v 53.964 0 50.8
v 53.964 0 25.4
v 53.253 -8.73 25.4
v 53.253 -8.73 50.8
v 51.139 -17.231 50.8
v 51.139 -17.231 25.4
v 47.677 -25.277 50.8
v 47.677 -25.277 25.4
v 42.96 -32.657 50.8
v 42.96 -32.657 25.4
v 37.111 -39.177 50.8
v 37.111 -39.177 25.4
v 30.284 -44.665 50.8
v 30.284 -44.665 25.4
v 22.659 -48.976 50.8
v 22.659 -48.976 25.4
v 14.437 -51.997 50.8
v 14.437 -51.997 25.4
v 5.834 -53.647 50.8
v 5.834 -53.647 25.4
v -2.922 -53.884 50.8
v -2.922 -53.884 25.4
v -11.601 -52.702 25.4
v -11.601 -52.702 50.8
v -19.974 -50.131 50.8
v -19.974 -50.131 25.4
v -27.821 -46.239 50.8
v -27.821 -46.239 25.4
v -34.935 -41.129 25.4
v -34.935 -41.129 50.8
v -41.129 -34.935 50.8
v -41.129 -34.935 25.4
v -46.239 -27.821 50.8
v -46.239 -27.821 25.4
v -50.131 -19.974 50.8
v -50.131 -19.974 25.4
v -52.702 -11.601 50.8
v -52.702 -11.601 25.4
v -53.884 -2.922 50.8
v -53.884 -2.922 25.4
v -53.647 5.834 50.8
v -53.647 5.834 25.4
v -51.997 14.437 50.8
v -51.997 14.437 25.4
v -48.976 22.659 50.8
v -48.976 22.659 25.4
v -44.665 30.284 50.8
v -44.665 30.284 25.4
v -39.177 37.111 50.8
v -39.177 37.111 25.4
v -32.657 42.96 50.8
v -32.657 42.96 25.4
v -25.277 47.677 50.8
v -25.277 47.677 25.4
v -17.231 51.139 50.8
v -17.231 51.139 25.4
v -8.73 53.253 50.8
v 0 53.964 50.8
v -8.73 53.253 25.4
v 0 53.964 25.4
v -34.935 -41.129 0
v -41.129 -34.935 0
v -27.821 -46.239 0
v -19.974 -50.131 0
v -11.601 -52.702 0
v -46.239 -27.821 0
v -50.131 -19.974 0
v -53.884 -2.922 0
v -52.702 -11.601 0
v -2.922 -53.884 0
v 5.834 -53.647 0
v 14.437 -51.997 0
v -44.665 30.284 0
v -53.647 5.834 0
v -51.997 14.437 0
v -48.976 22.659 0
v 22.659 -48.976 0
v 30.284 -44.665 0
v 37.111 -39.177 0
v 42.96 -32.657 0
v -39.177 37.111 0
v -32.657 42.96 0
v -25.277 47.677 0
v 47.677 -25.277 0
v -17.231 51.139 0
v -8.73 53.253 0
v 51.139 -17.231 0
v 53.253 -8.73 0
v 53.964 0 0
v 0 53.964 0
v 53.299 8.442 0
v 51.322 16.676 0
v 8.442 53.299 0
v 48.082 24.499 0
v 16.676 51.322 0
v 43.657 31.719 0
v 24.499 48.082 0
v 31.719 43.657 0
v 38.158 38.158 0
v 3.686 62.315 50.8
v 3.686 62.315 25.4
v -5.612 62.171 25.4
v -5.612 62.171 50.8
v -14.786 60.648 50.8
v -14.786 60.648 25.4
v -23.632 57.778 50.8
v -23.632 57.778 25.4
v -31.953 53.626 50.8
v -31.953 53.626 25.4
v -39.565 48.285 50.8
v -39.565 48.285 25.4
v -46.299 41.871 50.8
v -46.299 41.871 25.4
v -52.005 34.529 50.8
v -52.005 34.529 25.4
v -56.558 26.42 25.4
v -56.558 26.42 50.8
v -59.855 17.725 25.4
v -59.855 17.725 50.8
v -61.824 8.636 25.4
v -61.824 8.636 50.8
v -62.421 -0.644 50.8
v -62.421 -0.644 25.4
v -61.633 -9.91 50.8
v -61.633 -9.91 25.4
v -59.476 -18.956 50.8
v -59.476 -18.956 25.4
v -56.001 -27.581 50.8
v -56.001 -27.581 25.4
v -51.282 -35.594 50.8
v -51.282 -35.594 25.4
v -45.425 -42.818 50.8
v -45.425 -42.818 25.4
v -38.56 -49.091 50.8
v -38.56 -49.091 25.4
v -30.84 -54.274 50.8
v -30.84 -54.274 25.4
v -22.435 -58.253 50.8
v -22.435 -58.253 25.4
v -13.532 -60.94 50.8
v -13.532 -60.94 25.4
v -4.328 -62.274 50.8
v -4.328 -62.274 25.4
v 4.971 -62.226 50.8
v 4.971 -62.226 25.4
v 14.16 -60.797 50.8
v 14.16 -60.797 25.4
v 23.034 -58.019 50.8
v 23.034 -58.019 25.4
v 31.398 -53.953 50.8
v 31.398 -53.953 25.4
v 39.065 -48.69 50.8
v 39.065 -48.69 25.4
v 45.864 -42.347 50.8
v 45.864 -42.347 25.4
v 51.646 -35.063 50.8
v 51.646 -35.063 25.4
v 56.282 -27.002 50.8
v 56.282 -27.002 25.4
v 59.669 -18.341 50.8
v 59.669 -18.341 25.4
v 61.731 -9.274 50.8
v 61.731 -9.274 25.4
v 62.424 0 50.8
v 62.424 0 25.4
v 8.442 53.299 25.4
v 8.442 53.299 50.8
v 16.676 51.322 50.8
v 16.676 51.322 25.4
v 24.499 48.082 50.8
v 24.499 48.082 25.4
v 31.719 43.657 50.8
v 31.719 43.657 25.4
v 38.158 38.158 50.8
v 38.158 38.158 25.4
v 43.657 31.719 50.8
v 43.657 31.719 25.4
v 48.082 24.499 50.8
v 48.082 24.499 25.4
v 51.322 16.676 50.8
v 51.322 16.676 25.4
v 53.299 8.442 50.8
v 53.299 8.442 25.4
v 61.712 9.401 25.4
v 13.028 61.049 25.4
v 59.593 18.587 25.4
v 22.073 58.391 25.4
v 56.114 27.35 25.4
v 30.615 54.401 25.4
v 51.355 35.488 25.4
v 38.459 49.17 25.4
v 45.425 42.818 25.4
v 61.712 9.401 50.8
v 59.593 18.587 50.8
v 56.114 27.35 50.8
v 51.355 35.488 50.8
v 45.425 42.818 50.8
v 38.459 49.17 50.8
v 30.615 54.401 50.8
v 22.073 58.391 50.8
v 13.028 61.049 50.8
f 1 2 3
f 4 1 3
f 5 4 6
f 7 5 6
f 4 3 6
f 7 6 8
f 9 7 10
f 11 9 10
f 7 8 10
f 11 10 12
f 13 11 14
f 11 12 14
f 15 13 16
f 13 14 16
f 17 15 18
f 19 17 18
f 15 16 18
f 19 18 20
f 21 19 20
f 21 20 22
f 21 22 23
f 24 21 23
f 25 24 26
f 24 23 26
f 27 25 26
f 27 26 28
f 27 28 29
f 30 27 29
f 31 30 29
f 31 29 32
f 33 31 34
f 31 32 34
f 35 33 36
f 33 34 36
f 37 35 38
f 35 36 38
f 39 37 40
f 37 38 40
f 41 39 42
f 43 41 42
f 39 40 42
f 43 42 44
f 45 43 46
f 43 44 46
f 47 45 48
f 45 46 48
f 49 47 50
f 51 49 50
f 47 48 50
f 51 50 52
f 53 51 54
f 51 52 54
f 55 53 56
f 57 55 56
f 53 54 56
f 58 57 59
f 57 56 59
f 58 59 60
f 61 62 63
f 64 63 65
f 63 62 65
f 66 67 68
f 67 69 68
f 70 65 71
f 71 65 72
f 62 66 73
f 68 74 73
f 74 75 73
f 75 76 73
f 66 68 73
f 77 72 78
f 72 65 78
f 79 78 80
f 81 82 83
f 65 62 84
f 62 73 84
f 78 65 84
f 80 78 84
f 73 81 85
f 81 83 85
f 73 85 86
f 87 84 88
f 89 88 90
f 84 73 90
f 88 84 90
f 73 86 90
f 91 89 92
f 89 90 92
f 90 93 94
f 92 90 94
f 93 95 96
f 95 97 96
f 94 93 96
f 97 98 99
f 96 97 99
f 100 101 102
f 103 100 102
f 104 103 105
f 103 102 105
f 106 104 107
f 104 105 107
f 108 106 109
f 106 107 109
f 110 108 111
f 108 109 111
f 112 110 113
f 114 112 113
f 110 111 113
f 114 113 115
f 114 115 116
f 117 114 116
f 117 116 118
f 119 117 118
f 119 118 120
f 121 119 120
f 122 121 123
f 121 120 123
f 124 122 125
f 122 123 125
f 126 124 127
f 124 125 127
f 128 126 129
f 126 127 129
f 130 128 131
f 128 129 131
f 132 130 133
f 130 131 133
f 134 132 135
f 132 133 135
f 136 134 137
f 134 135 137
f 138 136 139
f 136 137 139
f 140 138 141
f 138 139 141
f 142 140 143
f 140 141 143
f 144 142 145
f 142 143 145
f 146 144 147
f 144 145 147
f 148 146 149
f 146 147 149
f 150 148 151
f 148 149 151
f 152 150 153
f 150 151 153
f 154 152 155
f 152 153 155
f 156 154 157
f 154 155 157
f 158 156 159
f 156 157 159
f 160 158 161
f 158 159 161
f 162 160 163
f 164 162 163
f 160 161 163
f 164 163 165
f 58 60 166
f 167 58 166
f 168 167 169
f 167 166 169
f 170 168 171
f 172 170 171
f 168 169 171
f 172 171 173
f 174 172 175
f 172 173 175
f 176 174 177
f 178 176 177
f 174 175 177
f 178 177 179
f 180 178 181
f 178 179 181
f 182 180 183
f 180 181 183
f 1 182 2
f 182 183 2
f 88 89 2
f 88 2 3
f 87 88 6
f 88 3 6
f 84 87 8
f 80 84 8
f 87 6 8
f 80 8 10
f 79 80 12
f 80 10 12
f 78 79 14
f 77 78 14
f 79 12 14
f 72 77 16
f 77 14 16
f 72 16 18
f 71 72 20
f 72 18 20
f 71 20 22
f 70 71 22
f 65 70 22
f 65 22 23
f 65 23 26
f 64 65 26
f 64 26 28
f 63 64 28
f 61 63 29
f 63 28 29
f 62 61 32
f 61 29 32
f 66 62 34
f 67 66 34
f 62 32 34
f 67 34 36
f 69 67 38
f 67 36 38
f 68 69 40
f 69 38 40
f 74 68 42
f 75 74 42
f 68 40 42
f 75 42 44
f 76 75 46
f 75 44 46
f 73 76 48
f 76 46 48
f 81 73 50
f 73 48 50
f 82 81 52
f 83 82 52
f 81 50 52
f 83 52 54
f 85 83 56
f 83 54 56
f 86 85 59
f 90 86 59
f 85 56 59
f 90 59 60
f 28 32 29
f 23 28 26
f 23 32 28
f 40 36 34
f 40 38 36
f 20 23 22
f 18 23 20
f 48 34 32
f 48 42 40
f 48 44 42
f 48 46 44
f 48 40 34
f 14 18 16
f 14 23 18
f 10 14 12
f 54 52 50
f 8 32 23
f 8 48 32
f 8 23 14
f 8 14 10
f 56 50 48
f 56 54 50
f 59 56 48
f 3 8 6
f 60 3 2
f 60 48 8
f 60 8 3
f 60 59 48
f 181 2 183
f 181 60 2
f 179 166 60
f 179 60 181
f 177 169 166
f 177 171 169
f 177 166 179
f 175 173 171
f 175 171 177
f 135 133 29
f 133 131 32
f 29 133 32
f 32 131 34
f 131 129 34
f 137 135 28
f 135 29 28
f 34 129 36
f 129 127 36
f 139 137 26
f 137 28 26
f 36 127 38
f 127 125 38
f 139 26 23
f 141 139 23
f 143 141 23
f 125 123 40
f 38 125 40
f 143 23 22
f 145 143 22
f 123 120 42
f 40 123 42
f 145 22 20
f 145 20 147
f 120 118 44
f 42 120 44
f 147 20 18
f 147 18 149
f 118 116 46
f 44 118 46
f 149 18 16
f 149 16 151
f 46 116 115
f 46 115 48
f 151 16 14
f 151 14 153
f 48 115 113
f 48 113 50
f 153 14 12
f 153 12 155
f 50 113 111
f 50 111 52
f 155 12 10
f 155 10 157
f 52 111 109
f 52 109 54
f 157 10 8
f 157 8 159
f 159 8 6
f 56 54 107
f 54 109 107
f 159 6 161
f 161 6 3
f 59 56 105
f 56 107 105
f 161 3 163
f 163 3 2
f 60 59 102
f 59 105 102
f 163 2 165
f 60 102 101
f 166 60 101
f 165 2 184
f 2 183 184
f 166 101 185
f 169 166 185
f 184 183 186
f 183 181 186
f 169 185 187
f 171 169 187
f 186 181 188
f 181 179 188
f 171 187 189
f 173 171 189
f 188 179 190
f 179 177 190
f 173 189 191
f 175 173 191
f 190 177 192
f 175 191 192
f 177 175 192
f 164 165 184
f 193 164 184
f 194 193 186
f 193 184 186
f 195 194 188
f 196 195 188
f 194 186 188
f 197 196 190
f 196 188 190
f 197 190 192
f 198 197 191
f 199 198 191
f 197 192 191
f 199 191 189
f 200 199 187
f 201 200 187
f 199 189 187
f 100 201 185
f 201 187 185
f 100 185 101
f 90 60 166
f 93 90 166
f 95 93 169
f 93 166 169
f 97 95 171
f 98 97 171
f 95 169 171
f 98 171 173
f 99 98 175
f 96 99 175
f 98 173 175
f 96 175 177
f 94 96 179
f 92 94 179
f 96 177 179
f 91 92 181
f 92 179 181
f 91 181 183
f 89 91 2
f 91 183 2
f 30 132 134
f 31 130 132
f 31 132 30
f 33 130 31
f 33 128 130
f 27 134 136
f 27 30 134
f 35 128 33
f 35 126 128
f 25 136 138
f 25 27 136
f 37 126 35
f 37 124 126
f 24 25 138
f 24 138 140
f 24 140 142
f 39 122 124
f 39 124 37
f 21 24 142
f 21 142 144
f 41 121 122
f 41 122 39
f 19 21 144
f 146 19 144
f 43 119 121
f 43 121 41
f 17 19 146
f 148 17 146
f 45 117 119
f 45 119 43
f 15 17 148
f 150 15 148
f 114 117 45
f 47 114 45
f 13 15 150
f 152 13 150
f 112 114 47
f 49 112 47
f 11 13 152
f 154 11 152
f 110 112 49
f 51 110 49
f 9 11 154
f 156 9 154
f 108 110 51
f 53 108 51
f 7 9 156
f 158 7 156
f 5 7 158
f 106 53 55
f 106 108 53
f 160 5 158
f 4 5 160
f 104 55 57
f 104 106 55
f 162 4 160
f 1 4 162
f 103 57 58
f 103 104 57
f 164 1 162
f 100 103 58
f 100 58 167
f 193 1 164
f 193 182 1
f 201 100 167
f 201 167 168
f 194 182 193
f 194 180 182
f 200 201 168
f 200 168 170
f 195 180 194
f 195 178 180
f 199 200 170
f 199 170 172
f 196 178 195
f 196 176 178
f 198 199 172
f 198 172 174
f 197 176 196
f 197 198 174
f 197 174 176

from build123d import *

# Parameters (mm, degrees)
F0_R          = 62.42416
F1_DEPTH      = 25.4
F5_DEPTH      = 25.4
F5_DEPTH_BACK = 25.4
F6_DEPTH      = 25.4


with BuildPart() as f1:
    # F0 (on Top) → F1 (new body)
    with BuildSketch(Plane.XY):
        Circle(F0_R)
    extrude(amount=F1_DEPTH)

    # F4 (on face) → F5 (cut, two sides)
    with BuildSketch(Plane.XY.offset(25.4)) as f5_sk:
        with BuildLine():
            ThreePointArc((62.42416, 0), (45.424979, 42.817602), (3.685779, 62.315253))
            ThreePointArc((3.685779, 62.315253), (-45.424979, -42.817602), (62.42416, 0))
        make_face()
        with BuildLine():
            ThreePointArc((53.963586, 0), (-38.158018, -38.158018), (0, 53.963586))
            ThreePointArc((0, 53.963586), (38.158018, 38.158018), (53.963586, 0))
        make_face(mode=Mode.SUBTRACT)
    extrude(amount=-F5_DEPTH, mode=Mode.SUBTRACT)
    extrude(f5_sk.sketch, amount=-F5_DEPTH_BACK, mode=Mode.SUBTRACT)


with BuildPart() as f6:
    # F3 (on face) → F6 (new body)
    with BuildSketch(Plane.XY.offset(25.4)):
        with BuildLine():
            ThreePointArc((3.685779, 62.315253), (-45.424979, -42.817602), (62.42416, 0))
            ThreePointArc((62.42416, 0), (45.424979, 42.817602), (3.685779, 62.315253))
        make_face()
        with BuildLine():
            ThreePointArc((53.963586, 0), (-38.158018, -38.158018), (0, 53.963586))
            ThreePointArc((0, 53.963586), (38.158018, 38.158018), (53.963586, 0))
        make_face(mode=Mode.SUBTRACT)
    extrude(amount=F6_DEPTH)


solid = Compound([f1.part, f6.part])
